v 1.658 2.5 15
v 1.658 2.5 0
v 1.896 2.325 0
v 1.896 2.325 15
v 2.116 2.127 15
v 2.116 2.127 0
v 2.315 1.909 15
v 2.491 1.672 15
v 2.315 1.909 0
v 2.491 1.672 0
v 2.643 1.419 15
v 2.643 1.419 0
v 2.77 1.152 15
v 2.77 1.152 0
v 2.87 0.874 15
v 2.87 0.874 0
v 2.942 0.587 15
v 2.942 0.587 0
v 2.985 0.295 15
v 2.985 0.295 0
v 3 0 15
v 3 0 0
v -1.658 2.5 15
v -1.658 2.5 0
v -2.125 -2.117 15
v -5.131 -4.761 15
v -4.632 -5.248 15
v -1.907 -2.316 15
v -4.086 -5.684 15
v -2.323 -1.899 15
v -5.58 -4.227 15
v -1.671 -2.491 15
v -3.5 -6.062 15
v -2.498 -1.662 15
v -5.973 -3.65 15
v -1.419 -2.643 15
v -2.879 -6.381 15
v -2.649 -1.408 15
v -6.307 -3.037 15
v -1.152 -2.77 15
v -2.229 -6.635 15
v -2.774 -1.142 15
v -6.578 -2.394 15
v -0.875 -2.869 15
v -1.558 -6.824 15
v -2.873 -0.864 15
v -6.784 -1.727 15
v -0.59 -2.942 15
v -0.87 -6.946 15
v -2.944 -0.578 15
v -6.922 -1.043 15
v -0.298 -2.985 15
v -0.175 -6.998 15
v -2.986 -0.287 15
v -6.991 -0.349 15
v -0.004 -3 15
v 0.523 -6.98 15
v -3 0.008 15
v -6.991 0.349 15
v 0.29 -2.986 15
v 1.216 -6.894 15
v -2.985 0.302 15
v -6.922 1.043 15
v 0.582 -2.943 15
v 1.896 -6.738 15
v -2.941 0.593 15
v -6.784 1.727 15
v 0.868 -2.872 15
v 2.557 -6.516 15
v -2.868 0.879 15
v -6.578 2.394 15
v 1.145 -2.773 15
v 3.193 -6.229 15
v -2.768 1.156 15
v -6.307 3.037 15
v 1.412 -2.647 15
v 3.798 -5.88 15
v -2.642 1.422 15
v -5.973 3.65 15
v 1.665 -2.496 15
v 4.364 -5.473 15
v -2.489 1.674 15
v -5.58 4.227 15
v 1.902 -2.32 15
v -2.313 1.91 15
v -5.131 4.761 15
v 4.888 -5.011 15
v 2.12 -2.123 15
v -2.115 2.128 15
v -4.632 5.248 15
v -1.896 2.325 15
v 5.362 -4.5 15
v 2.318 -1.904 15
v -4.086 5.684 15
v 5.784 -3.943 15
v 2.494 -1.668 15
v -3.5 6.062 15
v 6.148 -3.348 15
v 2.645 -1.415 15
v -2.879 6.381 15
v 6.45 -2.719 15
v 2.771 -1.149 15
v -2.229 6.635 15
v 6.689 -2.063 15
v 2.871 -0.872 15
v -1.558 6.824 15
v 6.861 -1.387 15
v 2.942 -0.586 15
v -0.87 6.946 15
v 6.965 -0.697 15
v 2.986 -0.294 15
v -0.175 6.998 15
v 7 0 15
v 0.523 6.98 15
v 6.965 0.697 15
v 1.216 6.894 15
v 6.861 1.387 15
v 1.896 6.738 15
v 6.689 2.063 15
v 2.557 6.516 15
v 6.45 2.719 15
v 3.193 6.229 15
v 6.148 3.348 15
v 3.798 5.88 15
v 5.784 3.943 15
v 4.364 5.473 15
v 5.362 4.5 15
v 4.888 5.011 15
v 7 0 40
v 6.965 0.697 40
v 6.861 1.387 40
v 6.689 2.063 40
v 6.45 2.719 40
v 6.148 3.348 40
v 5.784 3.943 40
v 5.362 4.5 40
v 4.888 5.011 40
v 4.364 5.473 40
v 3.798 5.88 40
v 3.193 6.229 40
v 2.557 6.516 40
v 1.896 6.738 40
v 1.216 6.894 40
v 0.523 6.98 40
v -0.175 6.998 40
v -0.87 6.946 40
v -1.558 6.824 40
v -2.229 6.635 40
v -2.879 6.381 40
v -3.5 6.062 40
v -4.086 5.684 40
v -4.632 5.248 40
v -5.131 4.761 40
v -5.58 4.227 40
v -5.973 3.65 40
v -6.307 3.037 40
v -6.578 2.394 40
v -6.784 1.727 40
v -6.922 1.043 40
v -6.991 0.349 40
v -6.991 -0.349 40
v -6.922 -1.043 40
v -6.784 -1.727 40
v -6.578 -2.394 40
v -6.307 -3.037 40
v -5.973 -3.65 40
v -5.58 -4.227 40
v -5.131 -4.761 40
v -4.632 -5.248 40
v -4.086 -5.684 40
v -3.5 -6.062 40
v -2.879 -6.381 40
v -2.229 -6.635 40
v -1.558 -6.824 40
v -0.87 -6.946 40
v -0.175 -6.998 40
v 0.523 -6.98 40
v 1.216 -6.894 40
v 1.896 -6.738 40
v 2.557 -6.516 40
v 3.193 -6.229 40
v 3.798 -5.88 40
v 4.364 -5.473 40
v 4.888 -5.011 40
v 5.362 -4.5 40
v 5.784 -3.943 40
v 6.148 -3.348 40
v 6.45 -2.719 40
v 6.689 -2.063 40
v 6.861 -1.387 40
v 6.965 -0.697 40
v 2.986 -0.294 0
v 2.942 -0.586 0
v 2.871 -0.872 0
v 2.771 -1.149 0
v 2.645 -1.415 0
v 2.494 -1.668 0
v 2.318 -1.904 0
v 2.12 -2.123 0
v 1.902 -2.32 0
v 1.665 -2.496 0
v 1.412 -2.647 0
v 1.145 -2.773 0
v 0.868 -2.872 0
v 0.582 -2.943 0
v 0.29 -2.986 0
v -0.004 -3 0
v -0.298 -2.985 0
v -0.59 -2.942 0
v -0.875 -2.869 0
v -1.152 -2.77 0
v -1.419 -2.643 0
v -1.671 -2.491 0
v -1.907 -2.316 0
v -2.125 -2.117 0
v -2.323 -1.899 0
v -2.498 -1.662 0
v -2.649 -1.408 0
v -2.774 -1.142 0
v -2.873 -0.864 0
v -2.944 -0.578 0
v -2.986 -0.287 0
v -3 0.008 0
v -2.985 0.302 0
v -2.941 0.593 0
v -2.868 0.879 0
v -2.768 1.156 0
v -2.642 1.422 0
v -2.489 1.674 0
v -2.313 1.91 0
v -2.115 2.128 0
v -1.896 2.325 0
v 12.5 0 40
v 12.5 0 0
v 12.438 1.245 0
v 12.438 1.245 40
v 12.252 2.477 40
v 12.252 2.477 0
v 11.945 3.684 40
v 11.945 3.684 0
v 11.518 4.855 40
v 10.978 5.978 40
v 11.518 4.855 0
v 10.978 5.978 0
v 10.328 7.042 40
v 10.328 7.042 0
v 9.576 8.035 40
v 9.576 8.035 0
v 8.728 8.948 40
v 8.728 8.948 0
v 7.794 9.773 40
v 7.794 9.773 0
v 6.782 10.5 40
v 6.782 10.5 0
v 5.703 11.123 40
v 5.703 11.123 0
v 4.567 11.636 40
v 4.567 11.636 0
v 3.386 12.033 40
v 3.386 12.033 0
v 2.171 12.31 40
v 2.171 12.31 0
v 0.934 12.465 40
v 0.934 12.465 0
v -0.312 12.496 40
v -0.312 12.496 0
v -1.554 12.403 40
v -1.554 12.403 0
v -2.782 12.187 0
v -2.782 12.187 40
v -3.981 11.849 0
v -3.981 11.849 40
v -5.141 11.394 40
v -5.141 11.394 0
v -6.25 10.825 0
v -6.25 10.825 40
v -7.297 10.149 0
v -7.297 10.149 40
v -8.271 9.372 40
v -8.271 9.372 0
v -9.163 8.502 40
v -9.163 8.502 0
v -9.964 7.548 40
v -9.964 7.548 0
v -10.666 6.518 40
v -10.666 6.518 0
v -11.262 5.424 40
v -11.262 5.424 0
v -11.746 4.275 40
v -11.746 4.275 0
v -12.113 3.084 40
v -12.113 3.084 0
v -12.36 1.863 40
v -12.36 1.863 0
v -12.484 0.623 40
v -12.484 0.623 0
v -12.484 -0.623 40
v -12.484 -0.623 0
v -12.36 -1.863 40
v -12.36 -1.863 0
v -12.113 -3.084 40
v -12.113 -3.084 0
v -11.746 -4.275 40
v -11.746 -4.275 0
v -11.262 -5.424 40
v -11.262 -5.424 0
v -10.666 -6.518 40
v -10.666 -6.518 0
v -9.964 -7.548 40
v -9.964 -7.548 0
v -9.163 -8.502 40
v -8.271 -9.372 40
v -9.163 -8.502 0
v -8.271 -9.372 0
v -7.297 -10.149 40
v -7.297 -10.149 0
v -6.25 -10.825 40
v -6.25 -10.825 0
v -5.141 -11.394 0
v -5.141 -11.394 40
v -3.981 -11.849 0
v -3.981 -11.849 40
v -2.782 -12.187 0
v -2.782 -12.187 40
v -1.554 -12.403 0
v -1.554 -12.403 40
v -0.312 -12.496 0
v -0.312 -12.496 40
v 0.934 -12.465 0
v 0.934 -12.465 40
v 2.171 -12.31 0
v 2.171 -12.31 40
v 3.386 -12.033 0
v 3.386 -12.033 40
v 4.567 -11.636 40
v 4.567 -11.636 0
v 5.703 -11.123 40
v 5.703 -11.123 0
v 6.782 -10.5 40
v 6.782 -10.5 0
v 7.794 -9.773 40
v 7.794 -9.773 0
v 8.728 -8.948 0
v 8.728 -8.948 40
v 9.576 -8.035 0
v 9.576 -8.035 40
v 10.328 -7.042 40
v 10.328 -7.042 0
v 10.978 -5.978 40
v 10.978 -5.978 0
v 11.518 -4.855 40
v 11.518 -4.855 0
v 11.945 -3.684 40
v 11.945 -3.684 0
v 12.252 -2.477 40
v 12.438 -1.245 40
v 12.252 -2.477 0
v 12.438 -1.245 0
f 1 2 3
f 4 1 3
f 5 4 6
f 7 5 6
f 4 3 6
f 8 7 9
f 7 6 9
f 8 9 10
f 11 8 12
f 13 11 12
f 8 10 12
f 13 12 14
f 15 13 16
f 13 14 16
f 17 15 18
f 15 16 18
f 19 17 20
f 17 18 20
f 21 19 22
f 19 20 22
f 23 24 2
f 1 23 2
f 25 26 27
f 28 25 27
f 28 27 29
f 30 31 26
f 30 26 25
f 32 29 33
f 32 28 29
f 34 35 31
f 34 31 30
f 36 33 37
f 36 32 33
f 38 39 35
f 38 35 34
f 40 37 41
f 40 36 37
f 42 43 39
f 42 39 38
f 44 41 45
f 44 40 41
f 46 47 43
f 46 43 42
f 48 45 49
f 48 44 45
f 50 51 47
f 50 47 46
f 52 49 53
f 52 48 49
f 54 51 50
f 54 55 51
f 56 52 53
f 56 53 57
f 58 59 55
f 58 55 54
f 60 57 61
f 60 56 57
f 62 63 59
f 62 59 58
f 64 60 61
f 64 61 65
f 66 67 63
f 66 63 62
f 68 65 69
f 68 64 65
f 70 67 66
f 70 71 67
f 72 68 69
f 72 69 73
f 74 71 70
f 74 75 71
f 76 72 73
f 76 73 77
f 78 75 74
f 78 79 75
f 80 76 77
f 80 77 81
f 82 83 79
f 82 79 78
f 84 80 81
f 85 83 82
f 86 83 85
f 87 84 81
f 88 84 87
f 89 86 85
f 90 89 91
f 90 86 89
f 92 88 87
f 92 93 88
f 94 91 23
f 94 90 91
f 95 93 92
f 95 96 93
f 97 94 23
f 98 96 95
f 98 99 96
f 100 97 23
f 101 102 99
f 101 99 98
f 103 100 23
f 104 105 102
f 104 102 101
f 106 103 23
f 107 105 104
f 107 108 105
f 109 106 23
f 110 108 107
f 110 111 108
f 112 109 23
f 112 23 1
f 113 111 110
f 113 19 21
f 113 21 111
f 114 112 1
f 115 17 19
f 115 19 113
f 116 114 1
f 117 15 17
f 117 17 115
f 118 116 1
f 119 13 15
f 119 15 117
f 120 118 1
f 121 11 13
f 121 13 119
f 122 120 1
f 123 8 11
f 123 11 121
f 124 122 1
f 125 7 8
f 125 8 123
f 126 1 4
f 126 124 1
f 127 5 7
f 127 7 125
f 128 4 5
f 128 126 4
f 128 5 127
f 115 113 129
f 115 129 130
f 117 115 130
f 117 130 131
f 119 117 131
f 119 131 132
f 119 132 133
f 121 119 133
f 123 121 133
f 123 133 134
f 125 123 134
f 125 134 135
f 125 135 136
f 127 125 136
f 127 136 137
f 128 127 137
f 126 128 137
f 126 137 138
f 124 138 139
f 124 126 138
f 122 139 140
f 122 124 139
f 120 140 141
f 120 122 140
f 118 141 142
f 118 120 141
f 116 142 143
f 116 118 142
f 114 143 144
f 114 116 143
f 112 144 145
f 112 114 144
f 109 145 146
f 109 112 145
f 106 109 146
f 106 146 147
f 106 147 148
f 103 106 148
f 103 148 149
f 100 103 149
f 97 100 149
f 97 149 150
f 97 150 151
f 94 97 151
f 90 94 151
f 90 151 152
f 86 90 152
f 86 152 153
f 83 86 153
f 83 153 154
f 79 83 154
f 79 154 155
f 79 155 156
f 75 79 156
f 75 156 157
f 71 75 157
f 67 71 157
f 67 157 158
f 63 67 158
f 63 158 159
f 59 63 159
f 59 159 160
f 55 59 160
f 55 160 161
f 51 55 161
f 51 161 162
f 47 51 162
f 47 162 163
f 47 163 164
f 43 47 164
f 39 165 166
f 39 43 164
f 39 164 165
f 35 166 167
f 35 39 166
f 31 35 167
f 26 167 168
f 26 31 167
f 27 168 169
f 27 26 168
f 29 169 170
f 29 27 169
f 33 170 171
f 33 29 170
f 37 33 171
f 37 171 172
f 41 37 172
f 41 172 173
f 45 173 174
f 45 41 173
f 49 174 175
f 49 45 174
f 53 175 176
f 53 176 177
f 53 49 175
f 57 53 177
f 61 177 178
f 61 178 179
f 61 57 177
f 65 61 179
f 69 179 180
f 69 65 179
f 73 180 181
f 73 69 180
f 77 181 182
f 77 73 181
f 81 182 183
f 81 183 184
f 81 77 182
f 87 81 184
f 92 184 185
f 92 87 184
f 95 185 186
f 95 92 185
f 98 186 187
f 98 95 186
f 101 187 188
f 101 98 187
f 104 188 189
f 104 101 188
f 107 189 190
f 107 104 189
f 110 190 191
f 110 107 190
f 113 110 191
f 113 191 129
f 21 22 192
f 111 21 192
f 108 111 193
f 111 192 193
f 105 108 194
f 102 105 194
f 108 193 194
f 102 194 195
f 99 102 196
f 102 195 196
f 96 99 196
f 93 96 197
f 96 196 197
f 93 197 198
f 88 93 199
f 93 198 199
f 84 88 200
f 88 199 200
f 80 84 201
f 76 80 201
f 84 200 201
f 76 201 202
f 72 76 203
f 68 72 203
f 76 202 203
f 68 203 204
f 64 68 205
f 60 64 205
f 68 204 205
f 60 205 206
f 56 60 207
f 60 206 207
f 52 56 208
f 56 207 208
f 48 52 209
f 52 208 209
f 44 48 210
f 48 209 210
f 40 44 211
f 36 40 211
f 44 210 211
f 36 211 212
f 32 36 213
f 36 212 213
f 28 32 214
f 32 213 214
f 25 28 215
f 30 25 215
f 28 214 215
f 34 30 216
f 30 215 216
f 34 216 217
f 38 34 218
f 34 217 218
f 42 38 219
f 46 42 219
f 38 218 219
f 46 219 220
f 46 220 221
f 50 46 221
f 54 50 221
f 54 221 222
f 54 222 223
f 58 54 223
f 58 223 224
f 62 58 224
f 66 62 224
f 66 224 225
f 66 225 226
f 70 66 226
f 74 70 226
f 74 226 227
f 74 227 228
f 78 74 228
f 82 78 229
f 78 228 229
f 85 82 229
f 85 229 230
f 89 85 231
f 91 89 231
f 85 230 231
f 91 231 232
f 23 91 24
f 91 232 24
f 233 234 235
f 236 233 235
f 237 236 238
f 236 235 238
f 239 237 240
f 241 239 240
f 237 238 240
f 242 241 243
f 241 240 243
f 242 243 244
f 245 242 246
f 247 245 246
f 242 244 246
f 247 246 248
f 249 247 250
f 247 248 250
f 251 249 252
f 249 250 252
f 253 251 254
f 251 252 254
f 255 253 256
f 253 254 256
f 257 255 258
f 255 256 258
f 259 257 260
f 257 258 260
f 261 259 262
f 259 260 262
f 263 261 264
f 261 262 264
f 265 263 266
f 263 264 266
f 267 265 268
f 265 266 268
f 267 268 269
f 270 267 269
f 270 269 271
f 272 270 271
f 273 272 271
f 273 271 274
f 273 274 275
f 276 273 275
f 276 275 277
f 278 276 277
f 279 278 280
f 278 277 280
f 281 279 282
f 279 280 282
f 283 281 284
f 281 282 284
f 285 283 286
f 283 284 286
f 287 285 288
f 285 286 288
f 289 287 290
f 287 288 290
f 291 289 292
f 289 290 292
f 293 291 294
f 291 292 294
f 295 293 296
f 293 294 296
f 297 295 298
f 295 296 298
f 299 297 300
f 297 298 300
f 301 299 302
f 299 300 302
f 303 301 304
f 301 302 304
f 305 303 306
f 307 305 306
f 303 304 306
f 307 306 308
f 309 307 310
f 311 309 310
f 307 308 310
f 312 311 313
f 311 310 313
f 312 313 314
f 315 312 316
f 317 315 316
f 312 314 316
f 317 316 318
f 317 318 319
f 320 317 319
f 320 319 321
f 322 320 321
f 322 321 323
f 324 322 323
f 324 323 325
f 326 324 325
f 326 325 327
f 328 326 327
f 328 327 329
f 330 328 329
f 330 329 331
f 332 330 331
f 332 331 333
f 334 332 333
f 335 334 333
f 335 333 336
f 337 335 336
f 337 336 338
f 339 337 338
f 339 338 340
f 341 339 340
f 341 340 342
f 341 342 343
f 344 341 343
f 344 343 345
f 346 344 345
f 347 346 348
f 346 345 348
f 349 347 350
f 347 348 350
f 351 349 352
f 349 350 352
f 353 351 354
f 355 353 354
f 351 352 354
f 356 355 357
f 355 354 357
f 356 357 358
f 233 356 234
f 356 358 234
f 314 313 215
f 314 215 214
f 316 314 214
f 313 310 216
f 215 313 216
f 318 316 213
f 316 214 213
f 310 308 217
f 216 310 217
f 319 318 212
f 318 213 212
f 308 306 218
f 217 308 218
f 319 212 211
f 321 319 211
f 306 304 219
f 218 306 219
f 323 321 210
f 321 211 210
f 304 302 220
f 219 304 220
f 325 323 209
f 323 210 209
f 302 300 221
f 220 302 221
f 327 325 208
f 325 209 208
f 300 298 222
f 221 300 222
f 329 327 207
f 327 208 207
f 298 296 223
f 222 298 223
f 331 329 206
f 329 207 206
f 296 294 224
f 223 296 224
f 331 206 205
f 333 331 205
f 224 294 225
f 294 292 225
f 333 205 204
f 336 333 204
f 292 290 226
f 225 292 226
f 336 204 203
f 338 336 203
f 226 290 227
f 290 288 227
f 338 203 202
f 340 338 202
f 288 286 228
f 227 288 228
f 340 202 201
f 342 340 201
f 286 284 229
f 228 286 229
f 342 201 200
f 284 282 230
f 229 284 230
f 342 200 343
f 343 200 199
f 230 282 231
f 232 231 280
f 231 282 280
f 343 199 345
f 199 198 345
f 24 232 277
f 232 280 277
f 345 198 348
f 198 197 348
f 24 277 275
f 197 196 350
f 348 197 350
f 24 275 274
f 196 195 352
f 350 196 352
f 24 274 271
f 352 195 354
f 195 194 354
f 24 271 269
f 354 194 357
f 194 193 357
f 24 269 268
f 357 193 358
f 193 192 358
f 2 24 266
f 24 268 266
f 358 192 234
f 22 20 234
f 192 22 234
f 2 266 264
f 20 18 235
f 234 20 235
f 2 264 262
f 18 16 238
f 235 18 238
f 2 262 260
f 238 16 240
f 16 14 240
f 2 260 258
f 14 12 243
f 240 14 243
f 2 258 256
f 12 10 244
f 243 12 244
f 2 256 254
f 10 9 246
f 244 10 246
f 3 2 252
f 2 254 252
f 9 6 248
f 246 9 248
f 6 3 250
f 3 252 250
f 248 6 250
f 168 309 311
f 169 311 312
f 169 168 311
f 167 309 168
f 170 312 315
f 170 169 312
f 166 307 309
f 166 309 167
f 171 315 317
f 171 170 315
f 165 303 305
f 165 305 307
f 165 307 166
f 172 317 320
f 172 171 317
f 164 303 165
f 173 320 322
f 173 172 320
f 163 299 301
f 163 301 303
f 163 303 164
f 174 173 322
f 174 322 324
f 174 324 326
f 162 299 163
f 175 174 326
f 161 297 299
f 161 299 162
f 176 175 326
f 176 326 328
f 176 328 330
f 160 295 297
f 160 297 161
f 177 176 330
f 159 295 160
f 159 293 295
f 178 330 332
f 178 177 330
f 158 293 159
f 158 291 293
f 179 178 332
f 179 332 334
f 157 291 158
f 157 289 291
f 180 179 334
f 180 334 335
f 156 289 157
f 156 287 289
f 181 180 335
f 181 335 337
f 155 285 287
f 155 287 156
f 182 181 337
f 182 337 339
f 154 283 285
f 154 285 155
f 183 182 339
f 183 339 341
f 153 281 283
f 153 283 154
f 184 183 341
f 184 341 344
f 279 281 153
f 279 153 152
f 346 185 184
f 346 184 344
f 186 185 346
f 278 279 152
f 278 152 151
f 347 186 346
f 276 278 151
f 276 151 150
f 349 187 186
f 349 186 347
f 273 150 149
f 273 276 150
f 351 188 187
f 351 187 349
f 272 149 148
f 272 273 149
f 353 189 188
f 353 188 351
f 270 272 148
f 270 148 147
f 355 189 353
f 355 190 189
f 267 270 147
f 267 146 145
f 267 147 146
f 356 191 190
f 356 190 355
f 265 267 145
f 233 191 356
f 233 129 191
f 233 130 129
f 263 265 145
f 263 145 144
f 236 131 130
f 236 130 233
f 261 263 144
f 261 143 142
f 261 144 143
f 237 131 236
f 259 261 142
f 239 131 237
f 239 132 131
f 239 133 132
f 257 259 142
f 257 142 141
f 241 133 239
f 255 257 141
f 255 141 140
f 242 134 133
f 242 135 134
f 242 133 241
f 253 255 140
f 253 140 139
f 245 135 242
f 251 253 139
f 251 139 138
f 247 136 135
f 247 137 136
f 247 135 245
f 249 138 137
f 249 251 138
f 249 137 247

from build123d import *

# Parameters (mm, degrees)
F0_R     = 12.5
F0_R_2   = 7
F1_DEPTH = 40
F2_DEPTH = 15


with BuildPart() as f1:
    # F0 (on Top) → F1 (new body)
    with BuildSketch(Plane.XY):
        Circle(F0_R)
        Circle(F0_R_2, mode=Mode.SUBTRACT)
    extrude(amount=F1_DEPTH)

    # F0 (on Top) → F2 (join)
    with BuildSketch(Plane.XY):
        Circle(F0_R_2)
        with BuildLine():
            ThreePointArc((1.658312, 2.5), (2.643382, 1.418637), (3, 0))
            ThreePointArc((3, 0), (-1.418637, -2.643382), (-1.658312, 2.5))
            ThreePointArc((-1.658312, 2.5), (0, 3), (1.658312, 2.5))
        make_face(mode=Mode.SUBTRACT)
        with BuildLine():
            Line((-1.658312, 2.5), (1.658312, 2.5))
            ThreePointArc((1.658312, 2.5), (0, 3), (-1.658312, 2.5))
        make_face()
    extrude(amount=F2_DEPTH)


solid = f1.part
